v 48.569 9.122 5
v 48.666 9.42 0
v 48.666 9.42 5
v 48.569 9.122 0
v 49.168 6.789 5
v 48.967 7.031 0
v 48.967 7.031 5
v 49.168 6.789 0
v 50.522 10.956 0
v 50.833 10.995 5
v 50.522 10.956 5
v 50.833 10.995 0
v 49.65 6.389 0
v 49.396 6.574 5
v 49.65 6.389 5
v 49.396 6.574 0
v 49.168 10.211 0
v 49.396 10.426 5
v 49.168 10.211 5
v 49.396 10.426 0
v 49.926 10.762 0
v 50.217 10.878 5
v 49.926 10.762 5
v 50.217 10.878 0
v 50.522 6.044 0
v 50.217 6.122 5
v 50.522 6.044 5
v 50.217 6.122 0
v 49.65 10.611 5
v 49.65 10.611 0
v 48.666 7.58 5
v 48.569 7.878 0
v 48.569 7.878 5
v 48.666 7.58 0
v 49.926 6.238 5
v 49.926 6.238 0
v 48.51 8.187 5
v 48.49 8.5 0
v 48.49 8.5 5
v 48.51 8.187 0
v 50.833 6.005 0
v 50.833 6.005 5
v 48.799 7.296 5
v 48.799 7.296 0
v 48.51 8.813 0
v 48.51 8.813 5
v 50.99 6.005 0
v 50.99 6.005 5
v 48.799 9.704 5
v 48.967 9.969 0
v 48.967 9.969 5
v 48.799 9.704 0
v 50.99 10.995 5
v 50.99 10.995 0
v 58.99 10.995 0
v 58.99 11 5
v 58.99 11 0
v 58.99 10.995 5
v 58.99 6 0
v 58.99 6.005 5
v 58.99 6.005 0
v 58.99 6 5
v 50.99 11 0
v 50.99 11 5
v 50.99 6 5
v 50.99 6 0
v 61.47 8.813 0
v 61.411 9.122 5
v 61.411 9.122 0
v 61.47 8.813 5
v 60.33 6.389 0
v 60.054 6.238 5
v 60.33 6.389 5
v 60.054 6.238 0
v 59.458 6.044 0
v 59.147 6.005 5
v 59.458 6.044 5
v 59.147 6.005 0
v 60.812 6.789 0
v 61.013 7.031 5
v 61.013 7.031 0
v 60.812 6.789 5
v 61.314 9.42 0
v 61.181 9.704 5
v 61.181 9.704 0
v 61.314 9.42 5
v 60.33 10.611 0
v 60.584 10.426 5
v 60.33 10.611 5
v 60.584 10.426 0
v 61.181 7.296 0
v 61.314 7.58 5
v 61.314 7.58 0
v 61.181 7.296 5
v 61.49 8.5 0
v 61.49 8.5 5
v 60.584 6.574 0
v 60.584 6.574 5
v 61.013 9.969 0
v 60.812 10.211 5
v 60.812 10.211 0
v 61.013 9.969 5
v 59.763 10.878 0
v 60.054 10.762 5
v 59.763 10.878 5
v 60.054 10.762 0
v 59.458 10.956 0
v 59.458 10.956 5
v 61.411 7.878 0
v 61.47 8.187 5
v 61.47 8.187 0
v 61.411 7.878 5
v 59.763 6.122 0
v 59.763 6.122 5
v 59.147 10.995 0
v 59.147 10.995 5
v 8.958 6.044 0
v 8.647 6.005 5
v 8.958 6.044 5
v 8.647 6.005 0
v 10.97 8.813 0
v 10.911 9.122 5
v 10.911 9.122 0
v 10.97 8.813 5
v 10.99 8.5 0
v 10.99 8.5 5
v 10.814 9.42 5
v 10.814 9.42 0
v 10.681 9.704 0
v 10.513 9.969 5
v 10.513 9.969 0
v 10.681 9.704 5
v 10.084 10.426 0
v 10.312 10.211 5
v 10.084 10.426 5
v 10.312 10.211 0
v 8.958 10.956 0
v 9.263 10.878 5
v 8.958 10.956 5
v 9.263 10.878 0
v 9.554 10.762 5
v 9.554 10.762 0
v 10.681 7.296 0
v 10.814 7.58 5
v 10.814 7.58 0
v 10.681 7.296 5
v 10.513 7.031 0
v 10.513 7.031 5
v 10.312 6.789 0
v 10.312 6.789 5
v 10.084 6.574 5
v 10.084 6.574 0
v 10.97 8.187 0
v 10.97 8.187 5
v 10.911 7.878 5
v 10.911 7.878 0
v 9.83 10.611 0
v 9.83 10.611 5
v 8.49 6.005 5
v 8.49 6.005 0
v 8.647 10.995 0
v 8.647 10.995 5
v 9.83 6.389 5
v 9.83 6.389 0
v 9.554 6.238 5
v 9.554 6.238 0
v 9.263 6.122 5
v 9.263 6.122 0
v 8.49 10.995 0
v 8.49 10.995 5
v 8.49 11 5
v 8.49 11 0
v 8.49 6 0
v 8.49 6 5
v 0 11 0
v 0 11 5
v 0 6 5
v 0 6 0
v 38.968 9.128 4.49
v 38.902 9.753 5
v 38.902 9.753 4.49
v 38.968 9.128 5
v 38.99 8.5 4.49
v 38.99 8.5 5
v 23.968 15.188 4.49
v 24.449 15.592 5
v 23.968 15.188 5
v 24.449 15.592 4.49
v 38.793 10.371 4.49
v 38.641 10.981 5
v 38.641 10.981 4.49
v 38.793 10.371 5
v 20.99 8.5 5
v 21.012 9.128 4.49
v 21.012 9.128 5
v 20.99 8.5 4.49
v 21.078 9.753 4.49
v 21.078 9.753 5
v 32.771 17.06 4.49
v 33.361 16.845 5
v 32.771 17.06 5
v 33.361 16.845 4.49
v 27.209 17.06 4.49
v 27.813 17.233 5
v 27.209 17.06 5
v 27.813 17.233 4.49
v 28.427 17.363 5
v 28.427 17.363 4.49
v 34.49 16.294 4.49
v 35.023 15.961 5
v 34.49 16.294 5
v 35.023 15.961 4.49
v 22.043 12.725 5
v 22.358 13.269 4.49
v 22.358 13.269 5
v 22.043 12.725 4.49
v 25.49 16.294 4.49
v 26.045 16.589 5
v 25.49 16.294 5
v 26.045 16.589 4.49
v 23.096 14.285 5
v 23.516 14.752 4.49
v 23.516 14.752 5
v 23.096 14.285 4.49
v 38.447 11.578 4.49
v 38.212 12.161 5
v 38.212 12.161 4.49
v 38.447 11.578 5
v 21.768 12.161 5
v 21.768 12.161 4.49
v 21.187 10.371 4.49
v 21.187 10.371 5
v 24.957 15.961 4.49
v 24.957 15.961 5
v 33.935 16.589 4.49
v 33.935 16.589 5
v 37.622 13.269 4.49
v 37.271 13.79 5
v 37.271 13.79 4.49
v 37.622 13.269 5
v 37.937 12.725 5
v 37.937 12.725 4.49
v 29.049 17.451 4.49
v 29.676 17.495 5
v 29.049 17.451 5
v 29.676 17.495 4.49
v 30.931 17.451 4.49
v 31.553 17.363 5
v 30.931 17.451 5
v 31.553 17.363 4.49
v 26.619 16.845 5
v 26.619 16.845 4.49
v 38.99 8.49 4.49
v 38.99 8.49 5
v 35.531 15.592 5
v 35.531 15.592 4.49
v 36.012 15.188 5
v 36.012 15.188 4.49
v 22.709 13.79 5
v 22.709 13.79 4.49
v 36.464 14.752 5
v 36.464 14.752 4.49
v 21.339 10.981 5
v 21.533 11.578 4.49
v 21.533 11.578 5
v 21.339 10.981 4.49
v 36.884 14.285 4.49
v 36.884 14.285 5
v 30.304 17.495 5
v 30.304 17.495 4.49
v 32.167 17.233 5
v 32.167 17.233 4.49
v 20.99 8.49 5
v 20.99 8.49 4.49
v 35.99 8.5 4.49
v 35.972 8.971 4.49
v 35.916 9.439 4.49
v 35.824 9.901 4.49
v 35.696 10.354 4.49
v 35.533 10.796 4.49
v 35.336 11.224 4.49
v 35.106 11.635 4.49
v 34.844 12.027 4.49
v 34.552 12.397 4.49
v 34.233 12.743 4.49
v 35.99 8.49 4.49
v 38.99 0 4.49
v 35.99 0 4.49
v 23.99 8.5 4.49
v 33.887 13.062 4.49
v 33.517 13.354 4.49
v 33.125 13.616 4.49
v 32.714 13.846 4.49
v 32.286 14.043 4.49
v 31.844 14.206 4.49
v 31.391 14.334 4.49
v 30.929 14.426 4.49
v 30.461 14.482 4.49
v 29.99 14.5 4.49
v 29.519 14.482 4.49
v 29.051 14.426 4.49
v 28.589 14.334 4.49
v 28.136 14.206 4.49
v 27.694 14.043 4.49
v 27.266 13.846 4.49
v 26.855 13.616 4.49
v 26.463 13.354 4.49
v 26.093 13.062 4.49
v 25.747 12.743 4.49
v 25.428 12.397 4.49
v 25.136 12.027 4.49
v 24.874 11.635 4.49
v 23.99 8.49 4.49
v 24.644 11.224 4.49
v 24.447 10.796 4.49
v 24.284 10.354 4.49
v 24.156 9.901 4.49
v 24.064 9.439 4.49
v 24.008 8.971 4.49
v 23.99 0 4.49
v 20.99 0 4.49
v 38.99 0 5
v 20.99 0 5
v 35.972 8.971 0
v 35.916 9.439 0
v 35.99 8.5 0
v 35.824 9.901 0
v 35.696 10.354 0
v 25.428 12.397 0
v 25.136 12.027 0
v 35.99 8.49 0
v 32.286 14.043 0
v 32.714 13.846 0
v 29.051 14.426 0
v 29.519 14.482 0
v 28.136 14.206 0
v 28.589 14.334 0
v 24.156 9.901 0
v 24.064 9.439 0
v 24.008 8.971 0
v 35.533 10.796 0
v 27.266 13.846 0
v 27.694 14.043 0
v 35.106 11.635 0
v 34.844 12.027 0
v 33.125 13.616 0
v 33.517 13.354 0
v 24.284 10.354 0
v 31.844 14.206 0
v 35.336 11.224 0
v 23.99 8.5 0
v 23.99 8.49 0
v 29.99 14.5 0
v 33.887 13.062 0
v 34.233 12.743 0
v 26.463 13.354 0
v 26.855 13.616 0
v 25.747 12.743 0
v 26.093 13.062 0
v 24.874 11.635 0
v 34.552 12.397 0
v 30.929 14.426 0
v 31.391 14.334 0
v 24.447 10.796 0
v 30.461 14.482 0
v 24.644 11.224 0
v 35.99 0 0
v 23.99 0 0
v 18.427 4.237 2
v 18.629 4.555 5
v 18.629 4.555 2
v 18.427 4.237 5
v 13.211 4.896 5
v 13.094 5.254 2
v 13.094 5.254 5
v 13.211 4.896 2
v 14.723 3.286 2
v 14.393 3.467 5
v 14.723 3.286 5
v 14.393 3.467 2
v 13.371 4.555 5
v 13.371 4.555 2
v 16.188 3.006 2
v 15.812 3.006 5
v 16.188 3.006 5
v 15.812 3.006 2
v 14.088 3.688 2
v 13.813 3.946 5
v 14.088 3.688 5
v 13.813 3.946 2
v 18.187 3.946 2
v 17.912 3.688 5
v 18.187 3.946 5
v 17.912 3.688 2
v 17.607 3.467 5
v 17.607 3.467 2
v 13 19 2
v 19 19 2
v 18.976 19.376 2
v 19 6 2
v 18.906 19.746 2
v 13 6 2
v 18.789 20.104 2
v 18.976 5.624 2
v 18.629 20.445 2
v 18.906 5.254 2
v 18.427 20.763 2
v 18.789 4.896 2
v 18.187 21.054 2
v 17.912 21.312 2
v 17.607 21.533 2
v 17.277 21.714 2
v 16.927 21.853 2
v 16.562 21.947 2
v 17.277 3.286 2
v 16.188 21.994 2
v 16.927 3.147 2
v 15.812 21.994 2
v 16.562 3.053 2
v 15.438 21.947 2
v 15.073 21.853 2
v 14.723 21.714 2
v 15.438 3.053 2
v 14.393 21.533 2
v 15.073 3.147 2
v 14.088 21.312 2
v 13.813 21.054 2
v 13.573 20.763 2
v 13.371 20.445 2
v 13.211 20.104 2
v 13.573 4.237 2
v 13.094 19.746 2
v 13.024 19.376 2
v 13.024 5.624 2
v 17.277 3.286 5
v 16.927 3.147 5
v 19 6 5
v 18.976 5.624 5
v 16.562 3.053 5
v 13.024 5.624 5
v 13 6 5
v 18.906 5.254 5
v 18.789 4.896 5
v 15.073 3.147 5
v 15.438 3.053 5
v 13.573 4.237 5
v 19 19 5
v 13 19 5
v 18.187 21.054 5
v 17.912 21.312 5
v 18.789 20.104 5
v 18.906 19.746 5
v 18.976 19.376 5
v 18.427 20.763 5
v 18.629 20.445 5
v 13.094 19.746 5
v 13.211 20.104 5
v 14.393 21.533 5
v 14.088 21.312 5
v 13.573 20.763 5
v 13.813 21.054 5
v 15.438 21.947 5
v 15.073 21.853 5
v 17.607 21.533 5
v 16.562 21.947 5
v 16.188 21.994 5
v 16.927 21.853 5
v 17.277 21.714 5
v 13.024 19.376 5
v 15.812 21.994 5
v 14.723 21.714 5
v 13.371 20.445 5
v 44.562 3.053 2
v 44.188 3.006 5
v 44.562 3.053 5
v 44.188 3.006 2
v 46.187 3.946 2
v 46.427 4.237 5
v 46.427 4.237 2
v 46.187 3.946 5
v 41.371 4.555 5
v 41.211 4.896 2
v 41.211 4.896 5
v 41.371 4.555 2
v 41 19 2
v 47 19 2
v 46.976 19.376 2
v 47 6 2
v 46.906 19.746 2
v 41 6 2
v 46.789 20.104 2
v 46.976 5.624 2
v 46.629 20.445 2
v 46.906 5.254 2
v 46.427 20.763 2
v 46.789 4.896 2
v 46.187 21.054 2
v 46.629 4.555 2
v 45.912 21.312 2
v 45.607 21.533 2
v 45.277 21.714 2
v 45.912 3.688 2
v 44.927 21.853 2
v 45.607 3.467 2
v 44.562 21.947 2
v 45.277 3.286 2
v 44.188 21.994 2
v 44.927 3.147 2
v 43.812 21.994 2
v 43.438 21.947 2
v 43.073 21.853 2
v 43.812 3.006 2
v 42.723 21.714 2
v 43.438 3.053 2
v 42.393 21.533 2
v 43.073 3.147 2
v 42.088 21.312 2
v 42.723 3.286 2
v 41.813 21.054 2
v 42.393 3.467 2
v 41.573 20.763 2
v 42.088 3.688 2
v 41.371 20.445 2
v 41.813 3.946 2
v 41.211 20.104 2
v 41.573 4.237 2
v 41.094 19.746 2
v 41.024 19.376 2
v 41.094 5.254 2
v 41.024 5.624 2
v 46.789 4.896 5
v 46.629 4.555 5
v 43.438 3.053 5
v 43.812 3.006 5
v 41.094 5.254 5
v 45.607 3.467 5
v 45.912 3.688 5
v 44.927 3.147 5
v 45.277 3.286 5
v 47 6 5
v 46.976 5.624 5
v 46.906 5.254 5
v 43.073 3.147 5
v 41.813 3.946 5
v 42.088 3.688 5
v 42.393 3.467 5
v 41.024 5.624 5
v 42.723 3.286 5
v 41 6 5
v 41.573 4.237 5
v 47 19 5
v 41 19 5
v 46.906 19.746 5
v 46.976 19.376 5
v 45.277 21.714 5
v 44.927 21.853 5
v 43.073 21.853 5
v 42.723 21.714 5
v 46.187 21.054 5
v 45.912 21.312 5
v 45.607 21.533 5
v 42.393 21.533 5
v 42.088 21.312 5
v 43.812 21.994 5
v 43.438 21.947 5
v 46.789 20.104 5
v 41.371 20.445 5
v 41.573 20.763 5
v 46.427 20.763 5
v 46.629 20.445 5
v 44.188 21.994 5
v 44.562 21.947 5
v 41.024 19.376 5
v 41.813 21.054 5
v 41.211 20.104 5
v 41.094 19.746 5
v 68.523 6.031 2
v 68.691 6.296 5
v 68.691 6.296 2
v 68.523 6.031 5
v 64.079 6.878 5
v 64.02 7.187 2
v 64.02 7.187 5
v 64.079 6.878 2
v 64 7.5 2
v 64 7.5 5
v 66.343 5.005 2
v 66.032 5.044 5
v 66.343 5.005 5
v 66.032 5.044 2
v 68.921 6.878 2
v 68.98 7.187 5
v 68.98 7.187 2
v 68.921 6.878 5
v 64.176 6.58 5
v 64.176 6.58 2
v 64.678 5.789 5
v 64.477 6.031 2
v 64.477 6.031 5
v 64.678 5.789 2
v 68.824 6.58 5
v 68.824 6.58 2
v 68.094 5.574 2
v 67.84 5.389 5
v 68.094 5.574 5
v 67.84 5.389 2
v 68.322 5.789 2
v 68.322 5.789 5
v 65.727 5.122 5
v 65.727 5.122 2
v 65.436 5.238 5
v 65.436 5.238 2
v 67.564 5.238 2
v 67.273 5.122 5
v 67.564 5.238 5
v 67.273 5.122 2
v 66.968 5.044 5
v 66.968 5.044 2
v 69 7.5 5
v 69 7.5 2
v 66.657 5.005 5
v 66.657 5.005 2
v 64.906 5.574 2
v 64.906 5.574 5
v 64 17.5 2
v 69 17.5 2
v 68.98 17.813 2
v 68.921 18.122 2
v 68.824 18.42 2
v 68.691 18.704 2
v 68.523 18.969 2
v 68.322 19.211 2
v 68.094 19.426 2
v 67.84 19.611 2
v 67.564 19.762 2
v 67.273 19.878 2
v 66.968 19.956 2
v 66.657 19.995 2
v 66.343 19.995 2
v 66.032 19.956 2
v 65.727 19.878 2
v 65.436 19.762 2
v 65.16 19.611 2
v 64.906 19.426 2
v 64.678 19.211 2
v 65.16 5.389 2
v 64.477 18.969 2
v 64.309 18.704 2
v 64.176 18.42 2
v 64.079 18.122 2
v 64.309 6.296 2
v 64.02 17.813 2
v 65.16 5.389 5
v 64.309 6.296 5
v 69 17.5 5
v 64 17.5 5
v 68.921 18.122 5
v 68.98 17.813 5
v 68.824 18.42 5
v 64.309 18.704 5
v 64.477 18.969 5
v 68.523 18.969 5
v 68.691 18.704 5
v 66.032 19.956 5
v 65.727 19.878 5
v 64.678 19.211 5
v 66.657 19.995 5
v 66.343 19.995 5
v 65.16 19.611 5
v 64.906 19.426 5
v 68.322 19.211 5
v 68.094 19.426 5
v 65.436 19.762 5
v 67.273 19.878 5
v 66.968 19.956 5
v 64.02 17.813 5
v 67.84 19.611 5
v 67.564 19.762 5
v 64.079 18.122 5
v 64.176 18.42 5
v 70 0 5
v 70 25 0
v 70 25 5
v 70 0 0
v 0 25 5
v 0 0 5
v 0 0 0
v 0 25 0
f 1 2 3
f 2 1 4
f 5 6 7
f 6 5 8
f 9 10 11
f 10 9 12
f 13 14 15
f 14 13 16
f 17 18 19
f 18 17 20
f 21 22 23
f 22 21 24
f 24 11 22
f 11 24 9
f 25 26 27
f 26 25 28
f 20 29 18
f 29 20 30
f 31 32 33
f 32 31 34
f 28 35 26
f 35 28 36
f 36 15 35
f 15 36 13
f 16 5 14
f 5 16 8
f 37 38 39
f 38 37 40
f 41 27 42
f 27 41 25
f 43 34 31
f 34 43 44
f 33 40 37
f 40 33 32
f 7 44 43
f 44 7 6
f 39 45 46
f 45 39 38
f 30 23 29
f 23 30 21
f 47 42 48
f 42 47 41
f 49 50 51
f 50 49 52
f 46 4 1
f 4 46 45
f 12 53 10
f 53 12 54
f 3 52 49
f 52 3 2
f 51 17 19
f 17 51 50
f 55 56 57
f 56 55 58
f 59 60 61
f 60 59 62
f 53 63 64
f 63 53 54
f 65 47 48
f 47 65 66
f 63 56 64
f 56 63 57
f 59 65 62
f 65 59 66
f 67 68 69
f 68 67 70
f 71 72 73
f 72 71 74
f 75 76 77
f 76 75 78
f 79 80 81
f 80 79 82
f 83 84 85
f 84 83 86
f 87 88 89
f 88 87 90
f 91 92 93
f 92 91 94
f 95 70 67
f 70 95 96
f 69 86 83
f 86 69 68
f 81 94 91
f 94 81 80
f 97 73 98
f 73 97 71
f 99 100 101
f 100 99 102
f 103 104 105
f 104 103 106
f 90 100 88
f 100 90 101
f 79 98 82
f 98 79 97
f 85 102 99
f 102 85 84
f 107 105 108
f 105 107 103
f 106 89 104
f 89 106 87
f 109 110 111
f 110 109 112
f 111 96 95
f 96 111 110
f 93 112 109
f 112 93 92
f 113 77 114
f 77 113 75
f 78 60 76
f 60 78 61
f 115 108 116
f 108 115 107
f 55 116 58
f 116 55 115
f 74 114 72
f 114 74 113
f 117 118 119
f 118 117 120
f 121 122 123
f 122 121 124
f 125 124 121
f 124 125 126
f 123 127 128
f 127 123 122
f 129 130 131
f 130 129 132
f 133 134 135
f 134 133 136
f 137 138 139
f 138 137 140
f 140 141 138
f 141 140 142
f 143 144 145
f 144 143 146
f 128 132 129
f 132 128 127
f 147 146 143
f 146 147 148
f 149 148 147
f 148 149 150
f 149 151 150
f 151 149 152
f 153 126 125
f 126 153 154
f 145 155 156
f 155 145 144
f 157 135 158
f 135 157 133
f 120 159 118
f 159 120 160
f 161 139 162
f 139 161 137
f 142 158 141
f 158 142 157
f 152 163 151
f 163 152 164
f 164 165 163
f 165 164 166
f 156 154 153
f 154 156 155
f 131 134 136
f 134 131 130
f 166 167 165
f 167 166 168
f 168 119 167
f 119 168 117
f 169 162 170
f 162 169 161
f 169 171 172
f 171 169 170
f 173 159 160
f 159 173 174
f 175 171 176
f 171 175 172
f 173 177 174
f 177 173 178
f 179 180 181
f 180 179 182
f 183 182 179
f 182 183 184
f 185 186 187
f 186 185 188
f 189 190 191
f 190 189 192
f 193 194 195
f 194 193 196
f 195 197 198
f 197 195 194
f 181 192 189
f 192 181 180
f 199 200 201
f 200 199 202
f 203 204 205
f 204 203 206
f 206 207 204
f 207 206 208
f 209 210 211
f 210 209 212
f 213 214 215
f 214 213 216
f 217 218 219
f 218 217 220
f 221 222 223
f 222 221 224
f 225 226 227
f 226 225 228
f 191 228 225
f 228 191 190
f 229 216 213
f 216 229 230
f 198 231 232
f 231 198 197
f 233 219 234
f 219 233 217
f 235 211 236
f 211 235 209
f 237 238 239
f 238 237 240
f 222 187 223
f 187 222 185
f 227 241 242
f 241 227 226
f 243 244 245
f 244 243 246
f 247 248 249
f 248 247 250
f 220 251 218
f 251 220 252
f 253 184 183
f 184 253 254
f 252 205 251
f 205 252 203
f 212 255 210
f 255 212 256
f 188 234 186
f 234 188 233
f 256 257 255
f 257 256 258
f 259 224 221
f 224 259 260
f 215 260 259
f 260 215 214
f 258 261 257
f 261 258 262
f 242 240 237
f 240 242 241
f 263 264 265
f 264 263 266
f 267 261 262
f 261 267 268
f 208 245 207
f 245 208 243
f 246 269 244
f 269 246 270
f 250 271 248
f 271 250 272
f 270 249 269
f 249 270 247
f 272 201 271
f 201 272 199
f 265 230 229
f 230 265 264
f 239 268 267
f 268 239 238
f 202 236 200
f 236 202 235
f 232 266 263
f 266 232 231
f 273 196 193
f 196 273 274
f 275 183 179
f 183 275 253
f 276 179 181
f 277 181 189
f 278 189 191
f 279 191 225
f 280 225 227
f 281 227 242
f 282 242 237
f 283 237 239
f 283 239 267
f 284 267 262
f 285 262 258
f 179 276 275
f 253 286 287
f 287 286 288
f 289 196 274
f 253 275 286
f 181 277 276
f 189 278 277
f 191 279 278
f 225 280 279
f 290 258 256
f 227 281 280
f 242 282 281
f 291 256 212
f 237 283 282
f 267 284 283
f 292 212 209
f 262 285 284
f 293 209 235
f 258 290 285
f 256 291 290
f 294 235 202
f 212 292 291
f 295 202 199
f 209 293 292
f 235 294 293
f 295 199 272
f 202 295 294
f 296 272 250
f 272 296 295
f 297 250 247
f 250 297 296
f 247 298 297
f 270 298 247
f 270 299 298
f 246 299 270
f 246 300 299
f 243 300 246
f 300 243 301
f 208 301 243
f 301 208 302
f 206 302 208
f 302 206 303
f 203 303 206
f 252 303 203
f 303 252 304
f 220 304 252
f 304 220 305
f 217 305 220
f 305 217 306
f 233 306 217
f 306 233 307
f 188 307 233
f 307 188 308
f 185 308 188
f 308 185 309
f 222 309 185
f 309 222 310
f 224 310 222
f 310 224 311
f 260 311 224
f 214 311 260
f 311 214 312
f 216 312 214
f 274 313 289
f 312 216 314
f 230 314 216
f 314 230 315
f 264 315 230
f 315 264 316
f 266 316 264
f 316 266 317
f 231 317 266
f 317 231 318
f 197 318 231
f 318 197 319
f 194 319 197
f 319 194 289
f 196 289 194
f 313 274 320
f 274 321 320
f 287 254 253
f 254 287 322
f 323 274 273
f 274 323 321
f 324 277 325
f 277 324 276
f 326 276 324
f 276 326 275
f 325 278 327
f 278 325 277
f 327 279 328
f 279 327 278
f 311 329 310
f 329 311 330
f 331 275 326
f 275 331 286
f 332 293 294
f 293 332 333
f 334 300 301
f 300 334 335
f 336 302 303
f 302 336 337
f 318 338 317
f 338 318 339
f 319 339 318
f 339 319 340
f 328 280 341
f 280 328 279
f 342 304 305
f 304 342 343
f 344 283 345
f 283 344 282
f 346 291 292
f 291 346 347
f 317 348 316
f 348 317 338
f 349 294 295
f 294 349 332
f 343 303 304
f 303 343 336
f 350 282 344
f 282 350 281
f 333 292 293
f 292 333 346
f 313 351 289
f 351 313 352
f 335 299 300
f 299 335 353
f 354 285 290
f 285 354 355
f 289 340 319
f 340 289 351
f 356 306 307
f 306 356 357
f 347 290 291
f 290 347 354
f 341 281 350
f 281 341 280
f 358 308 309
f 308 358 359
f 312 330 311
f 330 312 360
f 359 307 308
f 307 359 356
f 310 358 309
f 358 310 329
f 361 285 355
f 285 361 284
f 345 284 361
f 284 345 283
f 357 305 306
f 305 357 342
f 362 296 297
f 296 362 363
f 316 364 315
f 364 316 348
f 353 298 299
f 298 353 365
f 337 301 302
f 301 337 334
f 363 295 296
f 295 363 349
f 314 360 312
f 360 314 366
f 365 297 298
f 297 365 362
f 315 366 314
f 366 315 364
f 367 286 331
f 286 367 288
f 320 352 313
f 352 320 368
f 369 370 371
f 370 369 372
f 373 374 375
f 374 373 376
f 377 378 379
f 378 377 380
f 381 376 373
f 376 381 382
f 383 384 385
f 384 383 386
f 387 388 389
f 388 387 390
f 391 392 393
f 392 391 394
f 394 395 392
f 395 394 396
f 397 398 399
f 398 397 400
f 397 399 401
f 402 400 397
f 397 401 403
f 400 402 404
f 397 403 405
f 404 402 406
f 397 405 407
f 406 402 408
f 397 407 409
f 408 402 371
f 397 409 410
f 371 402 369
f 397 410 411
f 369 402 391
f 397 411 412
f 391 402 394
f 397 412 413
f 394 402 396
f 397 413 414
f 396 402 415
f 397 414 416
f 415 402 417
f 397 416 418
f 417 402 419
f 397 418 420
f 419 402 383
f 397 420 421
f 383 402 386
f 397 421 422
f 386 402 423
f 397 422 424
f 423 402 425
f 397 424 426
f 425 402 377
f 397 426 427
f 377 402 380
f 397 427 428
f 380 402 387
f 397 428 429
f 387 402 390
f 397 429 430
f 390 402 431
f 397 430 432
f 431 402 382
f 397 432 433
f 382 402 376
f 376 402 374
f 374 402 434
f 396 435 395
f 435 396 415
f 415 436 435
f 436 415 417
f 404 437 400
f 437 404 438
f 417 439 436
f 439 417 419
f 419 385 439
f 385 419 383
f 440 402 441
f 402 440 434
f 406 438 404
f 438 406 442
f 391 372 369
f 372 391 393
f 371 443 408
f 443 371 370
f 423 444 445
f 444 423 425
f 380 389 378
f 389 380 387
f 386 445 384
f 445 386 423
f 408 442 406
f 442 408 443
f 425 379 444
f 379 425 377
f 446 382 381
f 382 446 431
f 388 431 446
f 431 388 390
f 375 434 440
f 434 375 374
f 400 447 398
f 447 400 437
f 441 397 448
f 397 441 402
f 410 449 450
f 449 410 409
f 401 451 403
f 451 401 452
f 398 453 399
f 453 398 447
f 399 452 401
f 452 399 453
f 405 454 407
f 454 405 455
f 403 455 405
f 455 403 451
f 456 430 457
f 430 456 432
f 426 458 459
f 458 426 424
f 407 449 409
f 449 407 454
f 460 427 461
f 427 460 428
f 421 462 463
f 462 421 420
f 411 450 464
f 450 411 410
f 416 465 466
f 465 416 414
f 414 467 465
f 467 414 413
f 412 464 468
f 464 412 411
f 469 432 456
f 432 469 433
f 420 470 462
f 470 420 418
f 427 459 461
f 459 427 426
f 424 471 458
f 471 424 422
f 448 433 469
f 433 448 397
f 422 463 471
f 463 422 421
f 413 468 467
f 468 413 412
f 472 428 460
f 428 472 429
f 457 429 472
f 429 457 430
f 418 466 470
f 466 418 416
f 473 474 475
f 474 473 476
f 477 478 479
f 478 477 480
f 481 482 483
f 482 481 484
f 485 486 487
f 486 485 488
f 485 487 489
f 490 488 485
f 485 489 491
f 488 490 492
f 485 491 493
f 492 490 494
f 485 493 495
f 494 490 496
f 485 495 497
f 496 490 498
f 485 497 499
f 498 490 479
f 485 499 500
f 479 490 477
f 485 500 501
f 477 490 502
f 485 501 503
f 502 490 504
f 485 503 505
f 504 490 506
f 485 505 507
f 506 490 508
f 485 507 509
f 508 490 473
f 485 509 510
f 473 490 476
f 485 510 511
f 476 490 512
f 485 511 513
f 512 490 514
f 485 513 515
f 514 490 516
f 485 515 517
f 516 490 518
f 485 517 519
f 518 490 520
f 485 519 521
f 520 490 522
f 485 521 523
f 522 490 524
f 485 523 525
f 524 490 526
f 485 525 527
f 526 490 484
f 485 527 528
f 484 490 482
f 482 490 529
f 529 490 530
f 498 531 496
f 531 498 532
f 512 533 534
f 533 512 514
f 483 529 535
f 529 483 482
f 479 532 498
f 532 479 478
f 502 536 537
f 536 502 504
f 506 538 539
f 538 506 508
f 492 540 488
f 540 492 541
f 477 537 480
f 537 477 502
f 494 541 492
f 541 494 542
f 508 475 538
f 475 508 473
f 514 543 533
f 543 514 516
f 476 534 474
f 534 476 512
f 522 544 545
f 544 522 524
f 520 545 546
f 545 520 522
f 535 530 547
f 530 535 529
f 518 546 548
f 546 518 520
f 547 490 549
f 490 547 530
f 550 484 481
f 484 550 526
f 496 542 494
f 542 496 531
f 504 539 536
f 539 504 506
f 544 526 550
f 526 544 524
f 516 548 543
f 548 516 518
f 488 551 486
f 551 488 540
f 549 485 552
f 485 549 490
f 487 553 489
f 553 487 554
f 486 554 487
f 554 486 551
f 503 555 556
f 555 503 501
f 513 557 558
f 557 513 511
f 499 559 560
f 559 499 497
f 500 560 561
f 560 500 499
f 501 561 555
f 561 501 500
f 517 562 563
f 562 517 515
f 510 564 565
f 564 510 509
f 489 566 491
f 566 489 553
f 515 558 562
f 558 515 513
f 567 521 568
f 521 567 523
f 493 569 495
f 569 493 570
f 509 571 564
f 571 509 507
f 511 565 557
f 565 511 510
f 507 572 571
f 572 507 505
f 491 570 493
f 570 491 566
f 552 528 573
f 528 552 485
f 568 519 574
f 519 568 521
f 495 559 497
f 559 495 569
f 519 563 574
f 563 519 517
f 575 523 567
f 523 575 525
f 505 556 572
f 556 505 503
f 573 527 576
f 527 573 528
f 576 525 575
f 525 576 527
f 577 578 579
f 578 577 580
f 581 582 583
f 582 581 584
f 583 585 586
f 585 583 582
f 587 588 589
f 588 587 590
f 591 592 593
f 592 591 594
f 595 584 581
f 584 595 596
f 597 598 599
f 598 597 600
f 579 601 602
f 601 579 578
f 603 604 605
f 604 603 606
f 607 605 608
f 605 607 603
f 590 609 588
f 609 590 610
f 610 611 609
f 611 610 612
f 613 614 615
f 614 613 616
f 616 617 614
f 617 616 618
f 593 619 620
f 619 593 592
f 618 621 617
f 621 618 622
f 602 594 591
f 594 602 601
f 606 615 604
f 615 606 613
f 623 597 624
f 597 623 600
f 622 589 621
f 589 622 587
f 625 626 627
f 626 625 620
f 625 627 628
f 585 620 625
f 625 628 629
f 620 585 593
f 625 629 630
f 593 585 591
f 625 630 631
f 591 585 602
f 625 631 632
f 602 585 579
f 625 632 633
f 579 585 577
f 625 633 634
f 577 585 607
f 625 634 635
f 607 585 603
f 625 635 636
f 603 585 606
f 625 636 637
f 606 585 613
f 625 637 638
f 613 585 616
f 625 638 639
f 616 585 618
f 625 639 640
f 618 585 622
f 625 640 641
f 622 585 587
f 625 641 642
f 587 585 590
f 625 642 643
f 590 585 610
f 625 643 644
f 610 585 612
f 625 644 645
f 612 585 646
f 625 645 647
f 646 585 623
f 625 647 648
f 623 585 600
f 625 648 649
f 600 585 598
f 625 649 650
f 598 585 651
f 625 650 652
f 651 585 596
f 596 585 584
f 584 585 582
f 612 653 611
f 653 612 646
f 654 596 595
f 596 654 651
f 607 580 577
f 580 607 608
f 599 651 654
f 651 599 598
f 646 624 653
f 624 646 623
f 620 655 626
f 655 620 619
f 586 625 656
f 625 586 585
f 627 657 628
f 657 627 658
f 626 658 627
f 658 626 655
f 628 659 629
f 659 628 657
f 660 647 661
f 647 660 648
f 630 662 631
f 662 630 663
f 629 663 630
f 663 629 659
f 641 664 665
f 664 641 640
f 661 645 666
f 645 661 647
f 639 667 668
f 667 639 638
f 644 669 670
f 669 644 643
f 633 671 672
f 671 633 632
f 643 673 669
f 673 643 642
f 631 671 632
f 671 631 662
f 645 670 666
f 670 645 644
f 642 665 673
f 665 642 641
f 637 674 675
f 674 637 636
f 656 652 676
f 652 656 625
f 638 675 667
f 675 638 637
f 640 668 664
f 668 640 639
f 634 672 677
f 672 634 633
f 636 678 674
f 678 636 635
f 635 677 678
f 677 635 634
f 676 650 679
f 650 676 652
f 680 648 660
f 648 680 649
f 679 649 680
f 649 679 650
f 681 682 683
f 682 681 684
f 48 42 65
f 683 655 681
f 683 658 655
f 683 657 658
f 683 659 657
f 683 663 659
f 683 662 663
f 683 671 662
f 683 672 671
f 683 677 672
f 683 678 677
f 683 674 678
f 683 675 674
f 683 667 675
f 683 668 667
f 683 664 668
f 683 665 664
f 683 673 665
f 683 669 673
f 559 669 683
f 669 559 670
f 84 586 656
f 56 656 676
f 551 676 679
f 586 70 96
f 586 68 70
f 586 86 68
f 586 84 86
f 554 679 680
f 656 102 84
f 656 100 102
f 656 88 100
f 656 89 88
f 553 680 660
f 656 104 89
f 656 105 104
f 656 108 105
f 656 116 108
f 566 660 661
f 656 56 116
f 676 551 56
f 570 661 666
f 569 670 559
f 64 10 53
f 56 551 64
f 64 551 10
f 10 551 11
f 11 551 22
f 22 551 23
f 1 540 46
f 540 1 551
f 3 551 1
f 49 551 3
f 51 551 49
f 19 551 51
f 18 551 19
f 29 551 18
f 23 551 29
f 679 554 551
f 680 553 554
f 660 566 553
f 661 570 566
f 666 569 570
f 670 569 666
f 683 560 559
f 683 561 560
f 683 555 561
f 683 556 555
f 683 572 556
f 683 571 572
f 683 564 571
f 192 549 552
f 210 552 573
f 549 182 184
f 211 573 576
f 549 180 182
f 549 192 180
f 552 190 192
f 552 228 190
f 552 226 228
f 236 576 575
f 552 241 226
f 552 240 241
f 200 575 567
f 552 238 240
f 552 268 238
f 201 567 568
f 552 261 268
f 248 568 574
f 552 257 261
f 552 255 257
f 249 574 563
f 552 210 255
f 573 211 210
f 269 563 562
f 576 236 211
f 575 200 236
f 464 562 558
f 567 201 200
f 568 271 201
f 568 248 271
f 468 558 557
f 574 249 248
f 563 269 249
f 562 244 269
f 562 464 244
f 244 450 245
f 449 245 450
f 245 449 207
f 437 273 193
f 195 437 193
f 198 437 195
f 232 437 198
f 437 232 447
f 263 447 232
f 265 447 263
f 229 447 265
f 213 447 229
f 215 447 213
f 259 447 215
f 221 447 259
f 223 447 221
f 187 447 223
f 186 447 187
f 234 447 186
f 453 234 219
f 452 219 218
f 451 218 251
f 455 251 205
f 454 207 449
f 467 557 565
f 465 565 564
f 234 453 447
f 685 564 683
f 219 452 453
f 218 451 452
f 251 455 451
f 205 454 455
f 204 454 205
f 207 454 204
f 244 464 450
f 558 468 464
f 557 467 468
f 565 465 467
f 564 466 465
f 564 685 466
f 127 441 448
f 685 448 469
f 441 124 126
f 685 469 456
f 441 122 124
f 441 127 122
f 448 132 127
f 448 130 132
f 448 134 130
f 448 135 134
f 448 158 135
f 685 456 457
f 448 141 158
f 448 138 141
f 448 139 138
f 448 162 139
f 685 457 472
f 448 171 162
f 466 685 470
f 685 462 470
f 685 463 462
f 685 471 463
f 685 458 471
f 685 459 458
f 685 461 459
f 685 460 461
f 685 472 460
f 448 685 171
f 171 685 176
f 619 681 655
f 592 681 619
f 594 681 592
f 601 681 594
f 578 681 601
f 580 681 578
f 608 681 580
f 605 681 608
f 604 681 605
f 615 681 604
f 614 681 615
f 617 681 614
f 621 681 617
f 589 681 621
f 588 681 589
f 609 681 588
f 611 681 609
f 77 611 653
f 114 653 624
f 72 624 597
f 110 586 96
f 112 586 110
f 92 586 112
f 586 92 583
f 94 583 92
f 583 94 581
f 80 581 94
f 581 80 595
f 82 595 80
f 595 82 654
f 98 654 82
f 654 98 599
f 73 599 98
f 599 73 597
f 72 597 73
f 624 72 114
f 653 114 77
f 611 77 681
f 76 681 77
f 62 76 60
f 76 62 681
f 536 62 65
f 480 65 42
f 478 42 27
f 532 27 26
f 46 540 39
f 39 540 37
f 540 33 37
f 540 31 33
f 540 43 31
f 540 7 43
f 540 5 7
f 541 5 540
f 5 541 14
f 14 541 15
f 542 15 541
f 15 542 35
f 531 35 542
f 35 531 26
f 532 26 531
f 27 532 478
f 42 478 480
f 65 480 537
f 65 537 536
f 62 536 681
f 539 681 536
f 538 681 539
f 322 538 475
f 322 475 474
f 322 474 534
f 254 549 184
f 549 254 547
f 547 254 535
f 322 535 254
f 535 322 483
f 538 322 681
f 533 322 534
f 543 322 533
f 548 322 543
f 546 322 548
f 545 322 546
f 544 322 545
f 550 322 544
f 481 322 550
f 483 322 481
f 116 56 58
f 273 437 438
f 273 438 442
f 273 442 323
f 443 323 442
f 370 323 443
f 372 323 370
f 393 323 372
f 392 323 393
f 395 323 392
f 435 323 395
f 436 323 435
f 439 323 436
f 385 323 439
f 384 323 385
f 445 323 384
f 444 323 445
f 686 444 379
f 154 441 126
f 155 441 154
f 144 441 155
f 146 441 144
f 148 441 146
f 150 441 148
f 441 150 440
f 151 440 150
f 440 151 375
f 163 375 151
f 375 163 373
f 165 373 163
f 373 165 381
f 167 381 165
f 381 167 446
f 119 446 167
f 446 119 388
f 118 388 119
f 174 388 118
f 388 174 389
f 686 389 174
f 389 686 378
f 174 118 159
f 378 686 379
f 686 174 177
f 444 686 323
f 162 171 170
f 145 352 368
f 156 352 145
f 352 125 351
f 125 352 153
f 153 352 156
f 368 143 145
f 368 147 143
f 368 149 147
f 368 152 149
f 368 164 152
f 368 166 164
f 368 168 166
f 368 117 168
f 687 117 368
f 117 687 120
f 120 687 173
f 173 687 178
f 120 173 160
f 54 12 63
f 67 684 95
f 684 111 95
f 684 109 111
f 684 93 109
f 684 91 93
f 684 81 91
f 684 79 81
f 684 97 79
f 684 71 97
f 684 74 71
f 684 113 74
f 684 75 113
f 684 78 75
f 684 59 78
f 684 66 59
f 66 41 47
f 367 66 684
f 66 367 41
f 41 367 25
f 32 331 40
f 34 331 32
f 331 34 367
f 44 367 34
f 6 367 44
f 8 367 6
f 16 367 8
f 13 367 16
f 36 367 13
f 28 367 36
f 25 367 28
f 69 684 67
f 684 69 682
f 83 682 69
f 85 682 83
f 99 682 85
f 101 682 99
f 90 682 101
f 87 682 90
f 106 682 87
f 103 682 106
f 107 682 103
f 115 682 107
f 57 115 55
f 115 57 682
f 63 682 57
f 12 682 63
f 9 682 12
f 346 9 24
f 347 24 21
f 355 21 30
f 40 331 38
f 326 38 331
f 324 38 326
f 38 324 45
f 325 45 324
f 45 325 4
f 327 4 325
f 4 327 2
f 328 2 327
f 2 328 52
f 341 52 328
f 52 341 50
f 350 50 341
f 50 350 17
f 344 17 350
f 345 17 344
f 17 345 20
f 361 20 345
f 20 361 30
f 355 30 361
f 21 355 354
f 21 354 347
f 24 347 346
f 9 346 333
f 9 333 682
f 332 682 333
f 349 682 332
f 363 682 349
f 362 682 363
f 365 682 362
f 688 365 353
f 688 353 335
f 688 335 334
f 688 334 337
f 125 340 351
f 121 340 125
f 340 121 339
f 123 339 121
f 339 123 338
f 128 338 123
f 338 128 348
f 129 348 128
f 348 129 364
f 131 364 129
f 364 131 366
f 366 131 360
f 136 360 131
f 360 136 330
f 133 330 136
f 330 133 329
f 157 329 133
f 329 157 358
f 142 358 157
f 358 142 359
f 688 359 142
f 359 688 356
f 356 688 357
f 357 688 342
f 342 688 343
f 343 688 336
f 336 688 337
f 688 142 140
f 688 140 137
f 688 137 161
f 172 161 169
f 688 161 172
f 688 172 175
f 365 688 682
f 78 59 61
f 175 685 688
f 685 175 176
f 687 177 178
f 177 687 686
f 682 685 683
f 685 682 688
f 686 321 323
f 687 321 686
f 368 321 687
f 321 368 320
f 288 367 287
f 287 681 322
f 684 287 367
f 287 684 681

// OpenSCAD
//rotate([180,0]) difference(){
//  translate([0.01,0.01,0.01]) cube([69.96,24.96,6]);
base();
//}
module base() {
difference(){
  cube([70,25,5]);
  translate([-.01,8.5,-.01]) {
    translate([8.5,0]) cylinder(d=5,h=5.02,$fn=50);
    translate([0,-2.5]) cube([8.5,5,5.02]);
    translate([30,0,4.5]) cylinder(d=18,h=5.02,$fn=90);
    translate([21,-8.51,4.5]) cube([18,8.5,5.02]);
    translate([30,0]) cylinder(d=12,h=5.02,$fn=80);
    translate([24,-8.51]) cube([12,8.5,5.02]);
    translate([51,0]) {
      cylinder(d=5,h=5.02,$fn=50);
      translate([0,-2.5]) cube([8,5,5.02]);
      translate([8,0]) cylinder(d=5,h=5.02,$fn=50);
    }
  }
  for(x=[16,44])
  translate([x,6,2]) {
    cylinder(d=6,h=5.02,$fn=50);
    translate([-3,0]) cube([6,13,5.02]);
    translate([0,13]) cylinder(d=6,h=5.02,$fn=50);
    }
  translate([66.5,7.5,2]) {
    cylinder(d=5,h=5.02,$fn=50);
    translate([-2.5,0]) cube([5,10,5.02]);
    translate([0,10]) cylinder(d=5,h=5.02,$fn=50);
  }
}
}
